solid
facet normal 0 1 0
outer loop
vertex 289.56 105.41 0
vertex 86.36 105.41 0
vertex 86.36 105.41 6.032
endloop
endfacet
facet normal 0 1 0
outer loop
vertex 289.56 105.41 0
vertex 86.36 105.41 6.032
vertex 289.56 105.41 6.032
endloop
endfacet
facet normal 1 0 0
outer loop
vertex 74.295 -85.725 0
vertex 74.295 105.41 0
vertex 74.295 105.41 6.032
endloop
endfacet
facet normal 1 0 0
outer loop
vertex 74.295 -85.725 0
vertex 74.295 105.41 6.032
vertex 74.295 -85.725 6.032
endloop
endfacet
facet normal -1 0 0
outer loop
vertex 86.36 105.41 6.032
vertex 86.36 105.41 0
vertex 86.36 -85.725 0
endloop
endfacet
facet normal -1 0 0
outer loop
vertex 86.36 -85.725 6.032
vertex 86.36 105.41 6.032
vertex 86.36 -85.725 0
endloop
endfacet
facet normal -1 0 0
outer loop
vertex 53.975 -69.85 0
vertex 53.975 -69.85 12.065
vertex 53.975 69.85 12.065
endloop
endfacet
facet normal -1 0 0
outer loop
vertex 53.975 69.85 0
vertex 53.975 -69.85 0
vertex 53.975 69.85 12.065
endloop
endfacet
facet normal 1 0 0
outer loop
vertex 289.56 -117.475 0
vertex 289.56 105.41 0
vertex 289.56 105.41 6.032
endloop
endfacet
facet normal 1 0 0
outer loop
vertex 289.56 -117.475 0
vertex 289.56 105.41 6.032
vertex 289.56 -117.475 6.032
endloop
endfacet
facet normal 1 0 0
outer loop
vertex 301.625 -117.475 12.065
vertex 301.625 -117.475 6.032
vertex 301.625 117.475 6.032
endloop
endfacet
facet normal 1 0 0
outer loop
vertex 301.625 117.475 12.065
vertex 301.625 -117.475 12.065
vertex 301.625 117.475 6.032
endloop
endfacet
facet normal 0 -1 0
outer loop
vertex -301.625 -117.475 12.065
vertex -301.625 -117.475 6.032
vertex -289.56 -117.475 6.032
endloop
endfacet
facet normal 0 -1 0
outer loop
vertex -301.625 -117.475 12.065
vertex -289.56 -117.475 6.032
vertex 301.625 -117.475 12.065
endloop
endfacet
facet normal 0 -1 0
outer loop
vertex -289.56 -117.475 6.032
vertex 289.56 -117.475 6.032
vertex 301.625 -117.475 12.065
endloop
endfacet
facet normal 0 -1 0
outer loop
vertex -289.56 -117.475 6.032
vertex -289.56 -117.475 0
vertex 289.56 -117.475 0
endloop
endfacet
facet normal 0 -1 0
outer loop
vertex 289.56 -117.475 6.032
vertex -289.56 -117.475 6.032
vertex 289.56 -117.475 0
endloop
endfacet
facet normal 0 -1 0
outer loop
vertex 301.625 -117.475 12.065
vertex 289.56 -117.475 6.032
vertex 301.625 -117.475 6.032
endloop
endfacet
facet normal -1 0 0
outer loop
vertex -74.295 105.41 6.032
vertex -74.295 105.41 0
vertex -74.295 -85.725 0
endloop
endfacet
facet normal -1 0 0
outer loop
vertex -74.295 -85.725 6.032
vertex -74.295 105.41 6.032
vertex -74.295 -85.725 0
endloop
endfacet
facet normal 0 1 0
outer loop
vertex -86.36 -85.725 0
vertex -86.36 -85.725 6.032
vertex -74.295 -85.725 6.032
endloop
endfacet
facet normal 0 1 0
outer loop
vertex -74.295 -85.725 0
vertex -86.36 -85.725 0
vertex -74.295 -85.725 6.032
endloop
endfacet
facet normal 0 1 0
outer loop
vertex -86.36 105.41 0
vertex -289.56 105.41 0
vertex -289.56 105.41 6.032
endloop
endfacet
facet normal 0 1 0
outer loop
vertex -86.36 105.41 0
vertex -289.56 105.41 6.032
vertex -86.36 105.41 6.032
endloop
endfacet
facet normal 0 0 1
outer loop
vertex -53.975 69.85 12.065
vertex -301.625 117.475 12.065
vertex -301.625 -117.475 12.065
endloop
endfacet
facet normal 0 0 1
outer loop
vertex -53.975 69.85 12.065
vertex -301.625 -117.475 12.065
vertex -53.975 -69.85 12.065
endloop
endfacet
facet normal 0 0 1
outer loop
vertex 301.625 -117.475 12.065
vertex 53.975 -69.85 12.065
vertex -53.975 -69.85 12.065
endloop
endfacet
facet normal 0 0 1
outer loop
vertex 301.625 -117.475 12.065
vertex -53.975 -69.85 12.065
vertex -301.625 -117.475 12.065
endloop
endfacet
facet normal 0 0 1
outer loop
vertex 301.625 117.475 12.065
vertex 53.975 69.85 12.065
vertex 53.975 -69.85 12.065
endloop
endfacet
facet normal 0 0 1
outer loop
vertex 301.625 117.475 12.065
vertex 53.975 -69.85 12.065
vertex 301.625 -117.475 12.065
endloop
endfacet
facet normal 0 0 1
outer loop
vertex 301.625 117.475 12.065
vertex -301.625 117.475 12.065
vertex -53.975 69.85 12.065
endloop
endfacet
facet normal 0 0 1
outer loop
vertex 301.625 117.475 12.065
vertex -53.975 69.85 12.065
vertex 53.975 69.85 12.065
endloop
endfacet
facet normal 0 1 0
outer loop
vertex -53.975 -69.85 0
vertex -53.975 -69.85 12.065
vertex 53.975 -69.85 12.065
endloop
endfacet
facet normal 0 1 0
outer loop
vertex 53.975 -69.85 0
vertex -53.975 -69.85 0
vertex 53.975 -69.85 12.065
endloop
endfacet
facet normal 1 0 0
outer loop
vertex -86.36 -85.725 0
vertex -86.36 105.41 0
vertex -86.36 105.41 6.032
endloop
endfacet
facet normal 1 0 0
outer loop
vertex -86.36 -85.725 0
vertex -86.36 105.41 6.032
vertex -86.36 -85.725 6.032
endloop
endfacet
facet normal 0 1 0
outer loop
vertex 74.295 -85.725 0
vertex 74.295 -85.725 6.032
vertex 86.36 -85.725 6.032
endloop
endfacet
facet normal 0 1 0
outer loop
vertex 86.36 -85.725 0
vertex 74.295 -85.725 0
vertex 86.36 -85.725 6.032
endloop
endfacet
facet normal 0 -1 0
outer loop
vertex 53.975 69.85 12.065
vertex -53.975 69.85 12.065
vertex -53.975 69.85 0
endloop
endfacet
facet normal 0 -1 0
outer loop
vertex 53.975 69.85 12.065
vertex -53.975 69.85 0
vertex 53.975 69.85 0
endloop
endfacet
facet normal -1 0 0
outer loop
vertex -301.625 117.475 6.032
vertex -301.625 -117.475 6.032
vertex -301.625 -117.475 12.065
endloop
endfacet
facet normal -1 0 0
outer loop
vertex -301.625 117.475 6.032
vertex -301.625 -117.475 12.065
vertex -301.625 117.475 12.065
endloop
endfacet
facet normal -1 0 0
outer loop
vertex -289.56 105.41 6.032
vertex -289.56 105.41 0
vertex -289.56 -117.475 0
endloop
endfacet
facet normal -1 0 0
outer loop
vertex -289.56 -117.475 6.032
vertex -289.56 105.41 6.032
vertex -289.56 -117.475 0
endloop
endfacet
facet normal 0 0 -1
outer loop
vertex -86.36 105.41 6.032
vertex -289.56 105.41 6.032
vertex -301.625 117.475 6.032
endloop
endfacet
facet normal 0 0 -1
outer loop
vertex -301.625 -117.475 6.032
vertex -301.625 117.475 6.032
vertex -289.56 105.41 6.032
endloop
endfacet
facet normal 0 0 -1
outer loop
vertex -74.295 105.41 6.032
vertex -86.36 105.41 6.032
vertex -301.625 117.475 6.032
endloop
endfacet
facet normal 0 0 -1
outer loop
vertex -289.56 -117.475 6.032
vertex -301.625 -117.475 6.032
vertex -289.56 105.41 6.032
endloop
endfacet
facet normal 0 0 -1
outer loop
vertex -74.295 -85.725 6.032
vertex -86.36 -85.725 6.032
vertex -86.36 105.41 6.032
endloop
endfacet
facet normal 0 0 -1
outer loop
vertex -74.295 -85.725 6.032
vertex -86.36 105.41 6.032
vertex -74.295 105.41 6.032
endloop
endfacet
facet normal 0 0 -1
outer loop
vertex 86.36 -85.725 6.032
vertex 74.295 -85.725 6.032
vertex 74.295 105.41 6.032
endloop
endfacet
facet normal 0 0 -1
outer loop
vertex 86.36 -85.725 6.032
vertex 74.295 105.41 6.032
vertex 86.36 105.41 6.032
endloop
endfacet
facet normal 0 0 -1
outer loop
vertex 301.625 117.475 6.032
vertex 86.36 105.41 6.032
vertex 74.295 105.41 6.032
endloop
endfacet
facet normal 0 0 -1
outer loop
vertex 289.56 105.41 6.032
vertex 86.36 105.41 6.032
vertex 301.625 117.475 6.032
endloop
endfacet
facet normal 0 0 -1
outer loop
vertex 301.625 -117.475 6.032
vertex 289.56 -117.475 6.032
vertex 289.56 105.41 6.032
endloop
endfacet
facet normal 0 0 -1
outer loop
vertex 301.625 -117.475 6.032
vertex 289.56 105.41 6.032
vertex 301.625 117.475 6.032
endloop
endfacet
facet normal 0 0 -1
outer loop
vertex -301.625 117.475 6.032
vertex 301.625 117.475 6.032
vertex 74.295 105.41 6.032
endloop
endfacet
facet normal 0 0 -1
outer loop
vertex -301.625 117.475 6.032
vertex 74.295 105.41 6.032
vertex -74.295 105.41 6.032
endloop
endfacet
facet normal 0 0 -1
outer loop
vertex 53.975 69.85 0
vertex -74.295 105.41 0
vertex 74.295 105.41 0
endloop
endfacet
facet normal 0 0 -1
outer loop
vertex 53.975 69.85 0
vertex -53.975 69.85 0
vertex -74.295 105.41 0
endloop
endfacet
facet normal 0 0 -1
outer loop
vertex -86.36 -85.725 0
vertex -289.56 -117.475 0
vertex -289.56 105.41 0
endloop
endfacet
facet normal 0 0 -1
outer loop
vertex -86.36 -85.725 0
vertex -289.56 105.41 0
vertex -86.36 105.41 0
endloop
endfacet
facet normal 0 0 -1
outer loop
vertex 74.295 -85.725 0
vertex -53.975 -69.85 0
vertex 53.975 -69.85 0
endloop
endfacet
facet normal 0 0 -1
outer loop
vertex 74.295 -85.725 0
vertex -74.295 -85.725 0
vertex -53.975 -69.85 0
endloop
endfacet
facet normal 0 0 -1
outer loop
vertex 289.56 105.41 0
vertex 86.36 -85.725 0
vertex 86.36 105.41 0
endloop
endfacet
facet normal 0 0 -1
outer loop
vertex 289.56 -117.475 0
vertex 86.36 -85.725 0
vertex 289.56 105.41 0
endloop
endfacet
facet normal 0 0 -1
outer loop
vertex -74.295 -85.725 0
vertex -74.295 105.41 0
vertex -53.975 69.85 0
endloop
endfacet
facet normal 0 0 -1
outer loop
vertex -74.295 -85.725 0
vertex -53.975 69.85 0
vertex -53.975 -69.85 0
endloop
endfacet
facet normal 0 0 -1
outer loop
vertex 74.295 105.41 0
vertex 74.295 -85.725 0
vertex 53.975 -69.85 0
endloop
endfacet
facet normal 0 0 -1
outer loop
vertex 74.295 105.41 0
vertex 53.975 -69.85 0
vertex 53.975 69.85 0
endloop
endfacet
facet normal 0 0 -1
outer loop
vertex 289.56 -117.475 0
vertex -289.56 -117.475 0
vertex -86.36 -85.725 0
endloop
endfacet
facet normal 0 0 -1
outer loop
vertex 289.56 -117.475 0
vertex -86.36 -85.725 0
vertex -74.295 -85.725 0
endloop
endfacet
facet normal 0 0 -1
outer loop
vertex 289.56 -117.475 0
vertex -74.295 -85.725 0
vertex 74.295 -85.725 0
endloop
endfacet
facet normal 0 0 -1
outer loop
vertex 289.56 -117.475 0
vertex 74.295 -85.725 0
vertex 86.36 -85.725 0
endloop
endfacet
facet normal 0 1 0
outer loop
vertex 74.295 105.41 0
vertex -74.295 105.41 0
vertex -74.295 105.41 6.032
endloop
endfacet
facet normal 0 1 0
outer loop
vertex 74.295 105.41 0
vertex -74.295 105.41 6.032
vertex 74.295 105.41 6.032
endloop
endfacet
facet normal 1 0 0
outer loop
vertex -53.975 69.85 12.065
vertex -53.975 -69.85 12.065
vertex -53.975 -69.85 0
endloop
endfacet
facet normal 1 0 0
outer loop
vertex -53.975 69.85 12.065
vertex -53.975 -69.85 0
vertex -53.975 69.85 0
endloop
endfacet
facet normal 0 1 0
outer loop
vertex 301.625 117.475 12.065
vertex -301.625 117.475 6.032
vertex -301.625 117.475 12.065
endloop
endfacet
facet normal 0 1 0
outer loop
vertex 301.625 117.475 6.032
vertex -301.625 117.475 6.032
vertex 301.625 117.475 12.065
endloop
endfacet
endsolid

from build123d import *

# Parameters (mm, degrees)
F1_W      = 603.25
F1_H      = 234.95
F2_DEPTH  = 12.065
F3_W      = 12.065
F3_H      = 234.95
F4_DEPTH  = 6.0325
F5_W      = 12.065
F5_H      = 234.95
F6_DEPTH  = 6.0325
F7_W      = 12.065
F7_H      = 234.95
F8_DEPTH  = 6.0325
F9_W      = 12.065
F9_H      = 234.95
F10_DEPTH = 6.0325
F11_W     = 203.2
F11_H     = 12.065
F14_DEPTH = 6.0325
F12_W     = 148.59
F12_H     = 12.065
F15_DEPTH = 6.0325
F13_W     = 203.2
F13_H     = 12.065
F16_DEPTH = 6.0325
F17_W     = 12.065
F17_H     = 31.75
F18_DEPTH = 6.0325
F19_W     = 12.065
F19_H     = 31.75
F20_DEPTH = 6.0325
F21_W     = 107.95
F21_H     = 139.7
F22_DEPTH = 12.065


# Not quite as in the source:
# - a variable given as a bare number and used for a length is read in inches; the dataset says mm whatever the document's units were


with BuildPart() as f2:
    # F1 (on Top) → F2 (new body)
    with BuildSketch(Plane.XY):
        Rectangle(F1_W, F1_H)
    extrude(amount=F2_DEPTH)

    # F3 (on face) → F4 (cut)
    with BuildSketch(Plane(origin=(0, 0, 0), x_dir=(1, 0, 0), z_dir=(0, 0, -1))):
        with Locations((-295.5925, 0)):
            Rectangle(F3_W, F3_H)
    extrude(amount=-F4_DEPTH, mode=Mode.SUBTRACT)

    # F5 (on face) → F6 (cut)
    with BuildSketch(Plane(origin=(0, 0, 0), x_dir=(1, 0, 0), z_dir=(0, 0, -1))):
        with Locations((295.5925, 0)):
            Rectangle(F5_W, F5_H)
    extrude(amount=-F6_DEPTH, mode=Mode.SUBTRACT)

    # F7 (on face) → F8 (cut)
    with BuildSketch(Plane(origin=(0, 0, 0), x_dir=(1, 0, 0), z_dir=(0, 0, -1))):
        with Locations((80.3275, 0)):
            Rectangle(F7_W, F7_H)
    extrude(amount=-F8_DEPTH, mode=Mode.SUBTRACT)

    # F9 (on face) → F10 (cut)
    with BuildSketch(Plane(origin=(0, 0, 0), x_dir=(1, 0, 0), z_dir=(0, 0, -1))):
        with Locations((-80.3275, 0)):
            Rectangle(F9_W, F9_H)
    extrude(amount=-F10_DEPTH, mode=Mode.SUBTRACT)

    # F11 (on face) → F14 (cut)
    with BuildSketch(Plane(origin=(0, 0, 0), x_dir=(1, 0, 0), z_dir=(0, 0, -1))):
        with Locations((187.96, -111.4425)):
            Rectangle(F11_W, F11_H)
    extrude(amount=-F14_DEPTH, mode=Mode.SUBTRACT)

    # F12 (on face) → F15 (cut)
    with BuildSketch(Plane(origin=(0, 0, 0), x_dir=(1, 0, 0), z_dir=(0, 0, -1))):
        with Locations((0, -111.4425)):
            Rectangle(F12_W, F12_H)
    extrude(amount=-F15_DEPTH, mode=Mode.SUBTRACT)

    # F13 (on face) → F16 (cut)
    with BuildSketch(Plane(origin=(0, 0, 0), x_dir=(1, 0, 0), z_dir=(0, 0, -1))):
        with Locations((-187.96, -111.4425)):
            Rectangle(F13_W, F13_H)
    extrude(amount=-F16_DEPTH, mode=Mode.SUBTRACT)

    # F17 (on face) → F18 (join)
    with BuildSketch(Plane(origin=(0, 0, 6.0325), x_dir=(1, 0, 0), z_dir=(0, 0, -1))):
        with Locations((80.3275, 101.6)):
            Rectangle(F17_W, F17_H)
    extrude(amount=F18_DEPTH)

    # F19 (on face) → F20 (join)
    with BuildSketch(Plane(origin=(0, 0, 6.0325), x_dir=(1, 0, 0), z_dir=(0, 0, -1))):
        with Locations((-80.3275, 101.6)):
            Rectangle(F19_W, F19_H)
    extrude(amount=F20_DEPTH)

    # F21 (on face) → F22 (cut)
    with BuildSketch(Plane.XY.offset(12.065)):
        Rectangle(F21_W, F21_H)
    extrude(amount=-F22_DEPTH, mode=Mode.SUBTRACT)


solid = f2.part
